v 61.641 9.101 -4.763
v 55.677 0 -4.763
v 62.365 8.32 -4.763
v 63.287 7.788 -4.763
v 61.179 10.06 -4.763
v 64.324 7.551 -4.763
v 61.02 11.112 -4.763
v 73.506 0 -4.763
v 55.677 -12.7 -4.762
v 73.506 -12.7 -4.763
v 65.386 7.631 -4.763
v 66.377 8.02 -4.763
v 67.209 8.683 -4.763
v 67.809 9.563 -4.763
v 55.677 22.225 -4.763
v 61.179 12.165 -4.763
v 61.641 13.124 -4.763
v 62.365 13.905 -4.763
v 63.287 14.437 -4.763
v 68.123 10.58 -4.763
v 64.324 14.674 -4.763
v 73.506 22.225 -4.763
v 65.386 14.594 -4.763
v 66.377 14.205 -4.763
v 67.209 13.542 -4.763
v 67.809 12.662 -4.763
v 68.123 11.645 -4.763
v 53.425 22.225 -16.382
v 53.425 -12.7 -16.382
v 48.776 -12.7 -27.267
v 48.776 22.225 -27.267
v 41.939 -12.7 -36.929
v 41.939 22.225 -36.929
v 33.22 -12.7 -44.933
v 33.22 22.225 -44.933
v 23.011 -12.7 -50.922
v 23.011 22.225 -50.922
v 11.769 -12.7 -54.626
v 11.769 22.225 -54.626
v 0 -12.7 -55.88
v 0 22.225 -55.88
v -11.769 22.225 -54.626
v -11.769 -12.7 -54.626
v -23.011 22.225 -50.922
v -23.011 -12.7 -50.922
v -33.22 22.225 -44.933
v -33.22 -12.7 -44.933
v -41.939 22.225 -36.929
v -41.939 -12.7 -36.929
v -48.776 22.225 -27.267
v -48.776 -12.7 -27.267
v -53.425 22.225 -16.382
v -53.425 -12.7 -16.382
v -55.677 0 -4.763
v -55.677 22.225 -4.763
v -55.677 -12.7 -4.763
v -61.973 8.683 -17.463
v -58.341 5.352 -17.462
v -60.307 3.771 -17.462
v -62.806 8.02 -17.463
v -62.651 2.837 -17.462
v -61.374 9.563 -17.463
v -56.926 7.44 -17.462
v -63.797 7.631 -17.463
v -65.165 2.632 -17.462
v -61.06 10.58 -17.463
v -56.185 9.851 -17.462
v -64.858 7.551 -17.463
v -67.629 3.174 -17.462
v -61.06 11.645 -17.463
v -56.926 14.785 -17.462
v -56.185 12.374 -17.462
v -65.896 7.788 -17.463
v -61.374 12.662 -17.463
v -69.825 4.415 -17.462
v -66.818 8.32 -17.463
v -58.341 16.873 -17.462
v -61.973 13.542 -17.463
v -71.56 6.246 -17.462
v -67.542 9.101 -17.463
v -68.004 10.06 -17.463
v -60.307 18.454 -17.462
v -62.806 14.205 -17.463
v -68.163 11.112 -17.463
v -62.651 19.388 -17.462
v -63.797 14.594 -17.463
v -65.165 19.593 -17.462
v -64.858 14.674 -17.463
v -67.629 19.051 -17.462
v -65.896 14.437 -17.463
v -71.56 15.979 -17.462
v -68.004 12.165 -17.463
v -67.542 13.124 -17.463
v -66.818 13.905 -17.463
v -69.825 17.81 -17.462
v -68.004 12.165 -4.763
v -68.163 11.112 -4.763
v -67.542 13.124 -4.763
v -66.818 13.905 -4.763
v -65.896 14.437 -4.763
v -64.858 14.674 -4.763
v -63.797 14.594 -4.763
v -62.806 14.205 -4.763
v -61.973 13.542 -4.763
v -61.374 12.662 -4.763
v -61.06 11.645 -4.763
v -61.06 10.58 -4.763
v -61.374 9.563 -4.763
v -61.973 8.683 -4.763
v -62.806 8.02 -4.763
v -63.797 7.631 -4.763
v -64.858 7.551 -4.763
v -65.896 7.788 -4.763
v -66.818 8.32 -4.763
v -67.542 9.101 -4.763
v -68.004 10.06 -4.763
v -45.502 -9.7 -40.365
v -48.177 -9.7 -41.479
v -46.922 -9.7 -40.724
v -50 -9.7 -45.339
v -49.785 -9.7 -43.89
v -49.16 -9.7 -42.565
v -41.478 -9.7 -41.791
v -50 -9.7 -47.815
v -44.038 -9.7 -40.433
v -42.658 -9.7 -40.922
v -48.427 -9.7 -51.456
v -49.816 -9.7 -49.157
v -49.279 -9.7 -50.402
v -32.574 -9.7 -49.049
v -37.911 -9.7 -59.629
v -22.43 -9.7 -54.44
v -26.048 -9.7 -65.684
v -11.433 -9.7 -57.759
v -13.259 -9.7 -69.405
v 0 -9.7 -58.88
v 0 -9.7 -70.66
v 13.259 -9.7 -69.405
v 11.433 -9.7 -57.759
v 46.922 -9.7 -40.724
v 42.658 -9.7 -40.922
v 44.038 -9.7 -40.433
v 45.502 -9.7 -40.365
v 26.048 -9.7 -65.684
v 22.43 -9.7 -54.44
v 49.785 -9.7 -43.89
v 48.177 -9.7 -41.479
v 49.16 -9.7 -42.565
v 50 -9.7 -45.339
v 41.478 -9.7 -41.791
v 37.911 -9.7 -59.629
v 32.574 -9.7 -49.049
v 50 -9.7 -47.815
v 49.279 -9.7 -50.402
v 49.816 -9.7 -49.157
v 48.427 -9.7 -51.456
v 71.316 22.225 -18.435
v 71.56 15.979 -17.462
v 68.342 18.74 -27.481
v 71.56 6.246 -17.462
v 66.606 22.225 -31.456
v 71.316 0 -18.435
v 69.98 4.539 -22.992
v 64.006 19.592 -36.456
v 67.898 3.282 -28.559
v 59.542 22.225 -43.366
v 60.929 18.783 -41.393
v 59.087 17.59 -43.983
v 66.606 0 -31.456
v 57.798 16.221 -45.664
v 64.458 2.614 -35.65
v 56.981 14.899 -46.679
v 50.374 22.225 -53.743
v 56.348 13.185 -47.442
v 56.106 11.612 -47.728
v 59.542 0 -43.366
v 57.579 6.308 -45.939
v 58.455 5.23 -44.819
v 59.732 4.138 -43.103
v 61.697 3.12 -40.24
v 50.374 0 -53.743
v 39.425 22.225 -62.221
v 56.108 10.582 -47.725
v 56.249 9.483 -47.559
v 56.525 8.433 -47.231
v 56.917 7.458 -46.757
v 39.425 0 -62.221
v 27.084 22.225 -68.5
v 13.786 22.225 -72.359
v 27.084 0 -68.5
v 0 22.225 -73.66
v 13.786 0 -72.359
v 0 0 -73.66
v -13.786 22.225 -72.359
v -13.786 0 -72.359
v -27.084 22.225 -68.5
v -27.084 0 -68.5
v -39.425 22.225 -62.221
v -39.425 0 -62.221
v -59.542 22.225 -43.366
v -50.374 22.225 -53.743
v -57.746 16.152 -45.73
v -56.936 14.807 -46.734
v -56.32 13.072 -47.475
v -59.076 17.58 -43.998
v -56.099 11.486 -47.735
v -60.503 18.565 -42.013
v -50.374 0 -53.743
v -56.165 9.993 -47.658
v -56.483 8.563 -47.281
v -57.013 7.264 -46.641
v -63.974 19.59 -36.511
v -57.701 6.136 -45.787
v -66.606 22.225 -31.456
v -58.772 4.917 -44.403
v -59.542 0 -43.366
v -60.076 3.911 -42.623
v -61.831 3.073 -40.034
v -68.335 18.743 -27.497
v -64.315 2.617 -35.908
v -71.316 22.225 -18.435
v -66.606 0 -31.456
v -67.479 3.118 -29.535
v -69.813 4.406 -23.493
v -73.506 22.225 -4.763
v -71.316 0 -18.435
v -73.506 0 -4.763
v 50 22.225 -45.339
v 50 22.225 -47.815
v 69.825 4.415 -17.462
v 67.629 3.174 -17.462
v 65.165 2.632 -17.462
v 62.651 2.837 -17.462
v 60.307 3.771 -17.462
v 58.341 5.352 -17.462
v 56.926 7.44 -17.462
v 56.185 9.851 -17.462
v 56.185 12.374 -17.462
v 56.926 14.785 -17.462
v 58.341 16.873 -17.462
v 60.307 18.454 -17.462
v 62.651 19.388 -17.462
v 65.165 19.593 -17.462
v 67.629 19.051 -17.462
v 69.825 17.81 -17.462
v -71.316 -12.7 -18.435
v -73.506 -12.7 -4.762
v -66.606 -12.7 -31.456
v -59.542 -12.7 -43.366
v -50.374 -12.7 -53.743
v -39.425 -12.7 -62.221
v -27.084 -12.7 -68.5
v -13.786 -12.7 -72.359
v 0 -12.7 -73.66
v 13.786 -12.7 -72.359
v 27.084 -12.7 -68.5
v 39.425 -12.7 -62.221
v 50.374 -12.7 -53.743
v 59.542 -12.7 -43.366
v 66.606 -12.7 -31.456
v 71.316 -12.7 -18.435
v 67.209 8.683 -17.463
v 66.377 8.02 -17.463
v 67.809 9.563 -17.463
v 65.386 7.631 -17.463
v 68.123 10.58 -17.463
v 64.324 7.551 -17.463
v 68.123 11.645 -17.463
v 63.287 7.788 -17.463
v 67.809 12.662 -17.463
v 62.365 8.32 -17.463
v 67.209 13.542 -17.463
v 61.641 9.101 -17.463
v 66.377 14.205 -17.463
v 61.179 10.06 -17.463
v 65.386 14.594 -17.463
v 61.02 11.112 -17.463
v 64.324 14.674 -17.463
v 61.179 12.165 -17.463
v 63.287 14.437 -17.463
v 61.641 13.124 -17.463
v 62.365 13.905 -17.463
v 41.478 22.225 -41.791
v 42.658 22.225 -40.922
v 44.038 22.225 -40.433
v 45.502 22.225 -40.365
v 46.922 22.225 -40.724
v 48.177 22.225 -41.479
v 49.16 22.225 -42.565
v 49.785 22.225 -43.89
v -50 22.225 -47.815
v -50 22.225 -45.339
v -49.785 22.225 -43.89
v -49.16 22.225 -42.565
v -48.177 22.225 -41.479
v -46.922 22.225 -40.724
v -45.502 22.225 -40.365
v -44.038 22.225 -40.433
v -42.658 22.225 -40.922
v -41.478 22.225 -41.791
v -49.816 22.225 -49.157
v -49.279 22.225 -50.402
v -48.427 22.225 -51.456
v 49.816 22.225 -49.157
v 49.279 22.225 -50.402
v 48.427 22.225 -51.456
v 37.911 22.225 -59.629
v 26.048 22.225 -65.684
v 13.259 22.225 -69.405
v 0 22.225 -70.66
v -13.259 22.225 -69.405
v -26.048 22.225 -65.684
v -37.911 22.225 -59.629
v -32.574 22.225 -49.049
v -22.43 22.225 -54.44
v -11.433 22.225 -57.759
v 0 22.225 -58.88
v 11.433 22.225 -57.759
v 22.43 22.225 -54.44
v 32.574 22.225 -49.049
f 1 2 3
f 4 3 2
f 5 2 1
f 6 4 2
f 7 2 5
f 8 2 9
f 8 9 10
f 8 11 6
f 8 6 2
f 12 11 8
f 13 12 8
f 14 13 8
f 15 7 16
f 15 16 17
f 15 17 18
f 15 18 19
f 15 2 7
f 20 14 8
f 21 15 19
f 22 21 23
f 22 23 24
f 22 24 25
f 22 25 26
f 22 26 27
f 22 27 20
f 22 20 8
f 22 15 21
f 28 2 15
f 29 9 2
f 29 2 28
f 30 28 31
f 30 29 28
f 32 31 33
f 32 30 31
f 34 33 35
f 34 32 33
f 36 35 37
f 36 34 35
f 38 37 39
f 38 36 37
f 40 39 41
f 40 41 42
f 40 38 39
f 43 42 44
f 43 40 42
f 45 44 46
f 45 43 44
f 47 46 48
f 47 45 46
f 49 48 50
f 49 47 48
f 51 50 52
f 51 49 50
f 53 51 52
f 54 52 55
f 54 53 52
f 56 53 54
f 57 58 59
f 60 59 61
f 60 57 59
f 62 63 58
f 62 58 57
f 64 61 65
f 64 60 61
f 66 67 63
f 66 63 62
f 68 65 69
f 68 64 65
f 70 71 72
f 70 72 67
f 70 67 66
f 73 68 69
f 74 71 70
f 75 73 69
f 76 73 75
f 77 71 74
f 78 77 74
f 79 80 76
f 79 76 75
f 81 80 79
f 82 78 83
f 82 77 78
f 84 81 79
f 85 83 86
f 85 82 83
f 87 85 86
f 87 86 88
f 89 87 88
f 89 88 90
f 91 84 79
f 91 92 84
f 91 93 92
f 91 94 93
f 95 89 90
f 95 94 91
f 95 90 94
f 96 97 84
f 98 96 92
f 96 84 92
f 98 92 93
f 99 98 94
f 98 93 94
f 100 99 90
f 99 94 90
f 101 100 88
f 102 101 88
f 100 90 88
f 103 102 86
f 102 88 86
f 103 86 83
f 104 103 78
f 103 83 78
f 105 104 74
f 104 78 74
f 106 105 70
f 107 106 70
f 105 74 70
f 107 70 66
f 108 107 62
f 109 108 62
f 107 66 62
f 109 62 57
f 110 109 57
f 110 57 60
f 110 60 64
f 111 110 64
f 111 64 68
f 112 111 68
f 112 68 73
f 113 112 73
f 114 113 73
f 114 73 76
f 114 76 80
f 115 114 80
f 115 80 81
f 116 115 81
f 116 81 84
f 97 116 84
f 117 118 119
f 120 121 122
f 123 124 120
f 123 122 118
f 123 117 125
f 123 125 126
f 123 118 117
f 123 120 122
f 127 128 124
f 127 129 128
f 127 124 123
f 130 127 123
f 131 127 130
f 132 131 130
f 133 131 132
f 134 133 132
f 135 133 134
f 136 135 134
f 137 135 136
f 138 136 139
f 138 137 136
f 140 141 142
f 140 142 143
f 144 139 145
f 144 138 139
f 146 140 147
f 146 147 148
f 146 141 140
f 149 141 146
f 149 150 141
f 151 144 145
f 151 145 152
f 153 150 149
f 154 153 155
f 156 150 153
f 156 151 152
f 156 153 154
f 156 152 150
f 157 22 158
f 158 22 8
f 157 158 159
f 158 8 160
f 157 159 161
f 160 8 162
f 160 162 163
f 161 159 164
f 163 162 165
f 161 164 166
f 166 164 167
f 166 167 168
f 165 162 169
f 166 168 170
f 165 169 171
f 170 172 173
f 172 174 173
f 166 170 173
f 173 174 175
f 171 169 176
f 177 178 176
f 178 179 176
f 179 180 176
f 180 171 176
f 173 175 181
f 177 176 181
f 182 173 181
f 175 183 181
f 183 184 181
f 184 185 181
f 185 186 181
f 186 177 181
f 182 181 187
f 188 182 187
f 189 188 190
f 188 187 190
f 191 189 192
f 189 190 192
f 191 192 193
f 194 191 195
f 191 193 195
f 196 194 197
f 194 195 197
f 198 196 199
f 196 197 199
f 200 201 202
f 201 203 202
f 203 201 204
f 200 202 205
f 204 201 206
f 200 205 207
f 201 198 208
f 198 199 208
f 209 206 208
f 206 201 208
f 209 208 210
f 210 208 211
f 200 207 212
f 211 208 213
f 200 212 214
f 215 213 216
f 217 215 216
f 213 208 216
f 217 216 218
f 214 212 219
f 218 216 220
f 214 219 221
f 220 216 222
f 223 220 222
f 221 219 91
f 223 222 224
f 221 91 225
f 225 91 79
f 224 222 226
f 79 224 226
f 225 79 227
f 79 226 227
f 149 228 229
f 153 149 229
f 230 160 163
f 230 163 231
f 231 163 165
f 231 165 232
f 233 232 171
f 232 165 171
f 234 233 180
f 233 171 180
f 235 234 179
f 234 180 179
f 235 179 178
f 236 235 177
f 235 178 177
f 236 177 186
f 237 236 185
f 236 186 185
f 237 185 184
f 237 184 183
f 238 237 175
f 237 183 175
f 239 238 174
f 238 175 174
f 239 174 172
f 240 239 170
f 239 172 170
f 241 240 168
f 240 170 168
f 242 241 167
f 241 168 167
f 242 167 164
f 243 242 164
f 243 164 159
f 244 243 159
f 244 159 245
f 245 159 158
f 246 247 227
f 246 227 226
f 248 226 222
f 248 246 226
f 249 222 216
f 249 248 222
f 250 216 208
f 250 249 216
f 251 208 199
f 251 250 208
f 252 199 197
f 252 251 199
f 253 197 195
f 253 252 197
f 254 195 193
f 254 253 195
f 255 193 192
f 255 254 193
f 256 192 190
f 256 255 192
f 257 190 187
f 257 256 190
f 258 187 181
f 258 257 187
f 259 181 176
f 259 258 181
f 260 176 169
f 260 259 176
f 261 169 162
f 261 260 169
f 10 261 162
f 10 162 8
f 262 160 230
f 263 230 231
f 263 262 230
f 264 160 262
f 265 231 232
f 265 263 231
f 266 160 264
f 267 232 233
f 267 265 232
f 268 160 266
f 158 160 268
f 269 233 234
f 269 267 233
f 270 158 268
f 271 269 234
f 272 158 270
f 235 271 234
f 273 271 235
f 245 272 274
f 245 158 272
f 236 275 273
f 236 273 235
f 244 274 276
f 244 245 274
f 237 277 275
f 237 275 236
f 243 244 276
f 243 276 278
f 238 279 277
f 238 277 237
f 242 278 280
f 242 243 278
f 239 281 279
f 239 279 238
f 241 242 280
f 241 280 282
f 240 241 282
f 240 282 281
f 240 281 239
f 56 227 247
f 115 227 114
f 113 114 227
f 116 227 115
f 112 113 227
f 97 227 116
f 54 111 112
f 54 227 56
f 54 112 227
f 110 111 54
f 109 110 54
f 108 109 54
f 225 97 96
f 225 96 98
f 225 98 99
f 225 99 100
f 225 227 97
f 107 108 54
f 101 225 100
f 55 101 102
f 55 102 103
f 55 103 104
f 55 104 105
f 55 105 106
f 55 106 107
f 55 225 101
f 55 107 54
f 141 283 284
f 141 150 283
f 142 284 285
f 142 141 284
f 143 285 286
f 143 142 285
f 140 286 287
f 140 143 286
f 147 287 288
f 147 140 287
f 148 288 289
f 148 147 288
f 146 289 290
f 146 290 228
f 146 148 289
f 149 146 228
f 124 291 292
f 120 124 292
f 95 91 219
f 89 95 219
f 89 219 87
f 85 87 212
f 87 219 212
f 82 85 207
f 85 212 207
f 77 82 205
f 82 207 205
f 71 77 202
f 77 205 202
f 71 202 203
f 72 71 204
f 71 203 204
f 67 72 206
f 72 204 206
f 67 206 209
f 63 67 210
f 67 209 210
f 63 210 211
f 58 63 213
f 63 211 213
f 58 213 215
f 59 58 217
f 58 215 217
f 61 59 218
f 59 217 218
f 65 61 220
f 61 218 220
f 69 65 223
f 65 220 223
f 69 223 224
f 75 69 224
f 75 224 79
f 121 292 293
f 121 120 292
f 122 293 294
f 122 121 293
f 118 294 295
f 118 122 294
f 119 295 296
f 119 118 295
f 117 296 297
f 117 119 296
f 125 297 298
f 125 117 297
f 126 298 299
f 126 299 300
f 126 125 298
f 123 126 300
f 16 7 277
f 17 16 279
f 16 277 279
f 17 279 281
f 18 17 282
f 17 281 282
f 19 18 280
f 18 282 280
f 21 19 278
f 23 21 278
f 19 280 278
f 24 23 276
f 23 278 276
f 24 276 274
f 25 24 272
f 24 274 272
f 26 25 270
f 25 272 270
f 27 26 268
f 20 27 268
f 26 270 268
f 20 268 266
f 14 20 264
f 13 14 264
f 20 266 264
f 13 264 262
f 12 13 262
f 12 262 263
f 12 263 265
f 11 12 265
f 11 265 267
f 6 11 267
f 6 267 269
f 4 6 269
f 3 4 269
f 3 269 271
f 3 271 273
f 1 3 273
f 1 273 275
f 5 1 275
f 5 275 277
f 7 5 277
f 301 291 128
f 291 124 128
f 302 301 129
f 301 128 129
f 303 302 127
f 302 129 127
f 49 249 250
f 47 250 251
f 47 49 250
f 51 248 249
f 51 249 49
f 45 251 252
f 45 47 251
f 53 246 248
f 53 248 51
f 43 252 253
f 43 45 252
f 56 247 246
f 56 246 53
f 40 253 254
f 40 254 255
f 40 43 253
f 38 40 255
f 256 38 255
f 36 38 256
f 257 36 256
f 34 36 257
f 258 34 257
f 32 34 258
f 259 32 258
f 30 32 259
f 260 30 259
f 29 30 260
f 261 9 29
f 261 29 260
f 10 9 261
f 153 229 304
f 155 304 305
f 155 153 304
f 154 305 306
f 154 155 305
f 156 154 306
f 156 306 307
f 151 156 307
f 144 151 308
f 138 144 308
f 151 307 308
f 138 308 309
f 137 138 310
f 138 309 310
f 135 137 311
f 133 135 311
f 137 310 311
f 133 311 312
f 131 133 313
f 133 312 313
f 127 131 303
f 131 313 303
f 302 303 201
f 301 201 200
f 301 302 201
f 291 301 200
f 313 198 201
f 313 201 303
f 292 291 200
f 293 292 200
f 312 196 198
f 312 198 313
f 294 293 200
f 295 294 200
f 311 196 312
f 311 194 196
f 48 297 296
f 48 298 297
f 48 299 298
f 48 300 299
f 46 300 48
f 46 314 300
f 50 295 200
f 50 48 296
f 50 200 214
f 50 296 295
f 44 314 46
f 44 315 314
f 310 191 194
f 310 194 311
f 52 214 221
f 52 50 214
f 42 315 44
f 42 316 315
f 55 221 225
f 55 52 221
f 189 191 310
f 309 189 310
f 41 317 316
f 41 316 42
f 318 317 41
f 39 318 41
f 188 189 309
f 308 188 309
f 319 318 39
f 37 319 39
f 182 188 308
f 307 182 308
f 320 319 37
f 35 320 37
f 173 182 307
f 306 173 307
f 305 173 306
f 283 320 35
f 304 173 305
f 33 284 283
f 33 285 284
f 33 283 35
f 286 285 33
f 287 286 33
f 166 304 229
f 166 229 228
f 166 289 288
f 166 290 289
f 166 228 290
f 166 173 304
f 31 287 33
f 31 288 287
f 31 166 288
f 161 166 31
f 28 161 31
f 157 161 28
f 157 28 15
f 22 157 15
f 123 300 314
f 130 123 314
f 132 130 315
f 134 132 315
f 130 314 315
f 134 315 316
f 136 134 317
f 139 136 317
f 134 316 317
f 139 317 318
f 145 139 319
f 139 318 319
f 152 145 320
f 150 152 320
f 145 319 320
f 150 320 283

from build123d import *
from build123d.topology import SkipClean

# Parameters (mm, degrees)
SKETCH1_R               = 73.66
SKETCH1_R_2             = 55.88
BOSS_EXTRUDE1_DEPTH     = 22.225
CUT_EXTRUDE1_REACH      = 108.515
SKETCH3_W               = 174.179431321
SKETCH3_H               = 95.128766337
F_1_4_CLEARANCE_HOLE1_D = 7.14248
SKETCH5_R               = 8.5
CUT_EXTRUDE2_DEPTH      = 56.1975
BOSS_EXTRUDE3_START     = 12.7
BOSS_EXTRUDE3_DEPTH     = 12.7
CUT_EXTRUDE3_DEPTH      = 31.925
FILLET1_R               = 5


with BuildPart() as part:
    # Sketch1 → Boss-Extrude1 (new body)
    with BuildSketch(Plane(origin=(0, 0, 0), x_dir=(1, 0, 0), z_dir=(0, 1, 0))):
        with Locations(Location((0, 0, 0), (0, 0, 270))):
            Circle(SKETCH1_R)
        with Locations(Location((0, 0, 0), (0, 0, 270))):
            Circle(SKETCH1_R_2, mode=Mode.SUBTRACT)
    extrude(amount=BOSS_EXTRUDE1_DEPTH)

    # Sketch3 → Cut-Extrude1 (cut, up to next)
    with BuildSketch(Plane(origin=(0, 22.225, 0), x_dir=(1, 0, 0), z_dir=(0, 1, 0)), mode=Mode.PRIVATE) as cut_extrude1_sk1:
        with Locations((-0.022555156, -42.801883168)):
            Rectangle(SKETCH3_W, SKETCH3_H)
    cut_extrude1_tool1 = extrude(cut_extrude1_sk1.sketch, amount=-CUT_EXTRUDE1_REACH, mode=Mode.PRIVATE) & part.part
    add(cut_extrude1_tool1.solids().sort_by_distance((-0.022555, 22.225, 42.801883))[0], mode=Mode.SUBTRACT)

    # 1/4 Clearance Hole1 (through all)
    with Locations(Plane(origin=(-64.591280655, 11.1125, -4.7625), x_dir=(1, 0, 0), z_dir=(0, 0, 1))):
        with Locations((0, 0), (129.18256131, 0)):
            Hole(F_1_4_CLEARANCE_HOLE1_D / 2)

    # Sketch5 → Cut-Extrude2 (cut)
    with BuildSketch(Plane(origin=(0, 0, -73.66), x_dir=(-1, 0, 0), z_dir=(0, 0, -1))):
        with Locations((-64.591280655, 11.1125)):
            Circle(SKETCH5_R)
        with Locations((64.591280655, 11.1125)):
            Circle(SKETCH5_R)
    extrude(amount=-CUT_EXTRUDE2_DEPTH, mode=Mode.SUBTRACT)

    # Sketch7 → Boss-Extrude3 (add)
    with SkipClean():  # the faces are left unmerged after this step: merging them gives an invalid solid
        with BuildSketch(Plane.XZ.offset(BOSS_EXTRUDE3_START)):
            with BuildLine():
                Line((73.505878634, -4.7625), (55.676682676, -4.7625))
                ThreePointArc((55.676682676, -4.7625), (0, -55.88), (-55.676682676, -4.7625))
                Line((-55.676682676, -4.7625), (-73.505878634, -4.7625))
                ThreePointArc((-73.505878634, -4.7625), (0, -73.66), (73.505878634, -4.7625))
            make_face()
        extrude(amount=-BOSS_EXTRUDE3_DEPTH)

    # Sketch9 → Cut-Extrude3 (cut)
    with SkipClean():  # the faces are left unmerged after this step: merging them gives an invalid solid
        with BuildSketch(Plane(origin=(0, 22.225, 0), x_dir=(1, 0, 0), z_dir=(0, 1, 0))):
            with BuildLine():
                Line((-50, 49.928304598), (-50, 31.094282433))
                ThreePointArc((-50, 31.094282433), (0, 58.88), (50, 31.094282433))
                Line((50, 31.094282433), (50, 49.928304598))
                ThreePointArc((50, 49.928304598), (0, 70.66), (-50, 49.928304598))
            make_face()
        extrude(amount=-CUT_EXTRUDE3_DEPTH, mode=Mode.SUBTRACT)

    # Fillet1
    fillet1_edges = [part.edges().sort_by_distance(p)[0] for p in [
        (-50, 6.2625, -31.094282433),
        (50, 6.2625, -31.094282433),
        (50, 6.2625, -49.928304598),
        (-50, 6.2625, -49.928304598),
    ]]
    fillet(fillet1_edges, radius=FILLET1_R)


solid = part.part
